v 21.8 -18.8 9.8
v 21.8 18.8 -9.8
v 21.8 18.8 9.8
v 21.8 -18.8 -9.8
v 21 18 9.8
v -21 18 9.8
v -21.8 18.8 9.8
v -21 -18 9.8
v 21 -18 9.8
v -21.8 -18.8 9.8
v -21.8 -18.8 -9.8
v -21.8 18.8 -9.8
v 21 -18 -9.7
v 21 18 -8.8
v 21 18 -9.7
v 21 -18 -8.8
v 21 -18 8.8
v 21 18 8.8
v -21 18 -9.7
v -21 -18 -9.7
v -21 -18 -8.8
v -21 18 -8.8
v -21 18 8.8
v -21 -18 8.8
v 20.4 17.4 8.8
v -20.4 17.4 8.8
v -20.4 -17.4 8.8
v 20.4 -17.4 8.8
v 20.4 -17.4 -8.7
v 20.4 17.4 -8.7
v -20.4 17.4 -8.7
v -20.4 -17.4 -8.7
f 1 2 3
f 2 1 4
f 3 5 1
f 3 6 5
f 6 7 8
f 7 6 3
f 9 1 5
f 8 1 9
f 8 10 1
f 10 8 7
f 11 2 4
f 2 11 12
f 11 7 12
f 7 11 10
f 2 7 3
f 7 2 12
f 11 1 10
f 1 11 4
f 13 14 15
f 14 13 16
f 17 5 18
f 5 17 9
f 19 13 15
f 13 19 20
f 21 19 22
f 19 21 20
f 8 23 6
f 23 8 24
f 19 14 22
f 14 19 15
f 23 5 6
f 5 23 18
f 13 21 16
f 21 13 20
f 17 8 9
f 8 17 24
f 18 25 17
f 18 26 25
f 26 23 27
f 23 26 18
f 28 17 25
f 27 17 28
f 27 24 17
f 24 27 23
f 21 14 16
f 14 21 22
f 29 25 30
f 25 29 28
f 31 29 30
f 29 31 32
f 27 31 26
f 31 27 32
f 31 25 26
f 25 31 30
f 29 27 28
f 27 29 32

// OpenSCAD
difference() {
    cube([43.6,37.6,19.6], center=true);
    translate([0,0,0.1]) cube([42,36,19.6], center=true);
}
//Außenhülle
difference() {
   cube([43.6,37.6,17.6], center=true);
    translate([0,0,1.6]) cube([42,36,16,8], center=true);
    translate([0,0,0.1])
    cube([40.8,34.8,17.6], center=true);
}
//Auflagefläche Displaycover
